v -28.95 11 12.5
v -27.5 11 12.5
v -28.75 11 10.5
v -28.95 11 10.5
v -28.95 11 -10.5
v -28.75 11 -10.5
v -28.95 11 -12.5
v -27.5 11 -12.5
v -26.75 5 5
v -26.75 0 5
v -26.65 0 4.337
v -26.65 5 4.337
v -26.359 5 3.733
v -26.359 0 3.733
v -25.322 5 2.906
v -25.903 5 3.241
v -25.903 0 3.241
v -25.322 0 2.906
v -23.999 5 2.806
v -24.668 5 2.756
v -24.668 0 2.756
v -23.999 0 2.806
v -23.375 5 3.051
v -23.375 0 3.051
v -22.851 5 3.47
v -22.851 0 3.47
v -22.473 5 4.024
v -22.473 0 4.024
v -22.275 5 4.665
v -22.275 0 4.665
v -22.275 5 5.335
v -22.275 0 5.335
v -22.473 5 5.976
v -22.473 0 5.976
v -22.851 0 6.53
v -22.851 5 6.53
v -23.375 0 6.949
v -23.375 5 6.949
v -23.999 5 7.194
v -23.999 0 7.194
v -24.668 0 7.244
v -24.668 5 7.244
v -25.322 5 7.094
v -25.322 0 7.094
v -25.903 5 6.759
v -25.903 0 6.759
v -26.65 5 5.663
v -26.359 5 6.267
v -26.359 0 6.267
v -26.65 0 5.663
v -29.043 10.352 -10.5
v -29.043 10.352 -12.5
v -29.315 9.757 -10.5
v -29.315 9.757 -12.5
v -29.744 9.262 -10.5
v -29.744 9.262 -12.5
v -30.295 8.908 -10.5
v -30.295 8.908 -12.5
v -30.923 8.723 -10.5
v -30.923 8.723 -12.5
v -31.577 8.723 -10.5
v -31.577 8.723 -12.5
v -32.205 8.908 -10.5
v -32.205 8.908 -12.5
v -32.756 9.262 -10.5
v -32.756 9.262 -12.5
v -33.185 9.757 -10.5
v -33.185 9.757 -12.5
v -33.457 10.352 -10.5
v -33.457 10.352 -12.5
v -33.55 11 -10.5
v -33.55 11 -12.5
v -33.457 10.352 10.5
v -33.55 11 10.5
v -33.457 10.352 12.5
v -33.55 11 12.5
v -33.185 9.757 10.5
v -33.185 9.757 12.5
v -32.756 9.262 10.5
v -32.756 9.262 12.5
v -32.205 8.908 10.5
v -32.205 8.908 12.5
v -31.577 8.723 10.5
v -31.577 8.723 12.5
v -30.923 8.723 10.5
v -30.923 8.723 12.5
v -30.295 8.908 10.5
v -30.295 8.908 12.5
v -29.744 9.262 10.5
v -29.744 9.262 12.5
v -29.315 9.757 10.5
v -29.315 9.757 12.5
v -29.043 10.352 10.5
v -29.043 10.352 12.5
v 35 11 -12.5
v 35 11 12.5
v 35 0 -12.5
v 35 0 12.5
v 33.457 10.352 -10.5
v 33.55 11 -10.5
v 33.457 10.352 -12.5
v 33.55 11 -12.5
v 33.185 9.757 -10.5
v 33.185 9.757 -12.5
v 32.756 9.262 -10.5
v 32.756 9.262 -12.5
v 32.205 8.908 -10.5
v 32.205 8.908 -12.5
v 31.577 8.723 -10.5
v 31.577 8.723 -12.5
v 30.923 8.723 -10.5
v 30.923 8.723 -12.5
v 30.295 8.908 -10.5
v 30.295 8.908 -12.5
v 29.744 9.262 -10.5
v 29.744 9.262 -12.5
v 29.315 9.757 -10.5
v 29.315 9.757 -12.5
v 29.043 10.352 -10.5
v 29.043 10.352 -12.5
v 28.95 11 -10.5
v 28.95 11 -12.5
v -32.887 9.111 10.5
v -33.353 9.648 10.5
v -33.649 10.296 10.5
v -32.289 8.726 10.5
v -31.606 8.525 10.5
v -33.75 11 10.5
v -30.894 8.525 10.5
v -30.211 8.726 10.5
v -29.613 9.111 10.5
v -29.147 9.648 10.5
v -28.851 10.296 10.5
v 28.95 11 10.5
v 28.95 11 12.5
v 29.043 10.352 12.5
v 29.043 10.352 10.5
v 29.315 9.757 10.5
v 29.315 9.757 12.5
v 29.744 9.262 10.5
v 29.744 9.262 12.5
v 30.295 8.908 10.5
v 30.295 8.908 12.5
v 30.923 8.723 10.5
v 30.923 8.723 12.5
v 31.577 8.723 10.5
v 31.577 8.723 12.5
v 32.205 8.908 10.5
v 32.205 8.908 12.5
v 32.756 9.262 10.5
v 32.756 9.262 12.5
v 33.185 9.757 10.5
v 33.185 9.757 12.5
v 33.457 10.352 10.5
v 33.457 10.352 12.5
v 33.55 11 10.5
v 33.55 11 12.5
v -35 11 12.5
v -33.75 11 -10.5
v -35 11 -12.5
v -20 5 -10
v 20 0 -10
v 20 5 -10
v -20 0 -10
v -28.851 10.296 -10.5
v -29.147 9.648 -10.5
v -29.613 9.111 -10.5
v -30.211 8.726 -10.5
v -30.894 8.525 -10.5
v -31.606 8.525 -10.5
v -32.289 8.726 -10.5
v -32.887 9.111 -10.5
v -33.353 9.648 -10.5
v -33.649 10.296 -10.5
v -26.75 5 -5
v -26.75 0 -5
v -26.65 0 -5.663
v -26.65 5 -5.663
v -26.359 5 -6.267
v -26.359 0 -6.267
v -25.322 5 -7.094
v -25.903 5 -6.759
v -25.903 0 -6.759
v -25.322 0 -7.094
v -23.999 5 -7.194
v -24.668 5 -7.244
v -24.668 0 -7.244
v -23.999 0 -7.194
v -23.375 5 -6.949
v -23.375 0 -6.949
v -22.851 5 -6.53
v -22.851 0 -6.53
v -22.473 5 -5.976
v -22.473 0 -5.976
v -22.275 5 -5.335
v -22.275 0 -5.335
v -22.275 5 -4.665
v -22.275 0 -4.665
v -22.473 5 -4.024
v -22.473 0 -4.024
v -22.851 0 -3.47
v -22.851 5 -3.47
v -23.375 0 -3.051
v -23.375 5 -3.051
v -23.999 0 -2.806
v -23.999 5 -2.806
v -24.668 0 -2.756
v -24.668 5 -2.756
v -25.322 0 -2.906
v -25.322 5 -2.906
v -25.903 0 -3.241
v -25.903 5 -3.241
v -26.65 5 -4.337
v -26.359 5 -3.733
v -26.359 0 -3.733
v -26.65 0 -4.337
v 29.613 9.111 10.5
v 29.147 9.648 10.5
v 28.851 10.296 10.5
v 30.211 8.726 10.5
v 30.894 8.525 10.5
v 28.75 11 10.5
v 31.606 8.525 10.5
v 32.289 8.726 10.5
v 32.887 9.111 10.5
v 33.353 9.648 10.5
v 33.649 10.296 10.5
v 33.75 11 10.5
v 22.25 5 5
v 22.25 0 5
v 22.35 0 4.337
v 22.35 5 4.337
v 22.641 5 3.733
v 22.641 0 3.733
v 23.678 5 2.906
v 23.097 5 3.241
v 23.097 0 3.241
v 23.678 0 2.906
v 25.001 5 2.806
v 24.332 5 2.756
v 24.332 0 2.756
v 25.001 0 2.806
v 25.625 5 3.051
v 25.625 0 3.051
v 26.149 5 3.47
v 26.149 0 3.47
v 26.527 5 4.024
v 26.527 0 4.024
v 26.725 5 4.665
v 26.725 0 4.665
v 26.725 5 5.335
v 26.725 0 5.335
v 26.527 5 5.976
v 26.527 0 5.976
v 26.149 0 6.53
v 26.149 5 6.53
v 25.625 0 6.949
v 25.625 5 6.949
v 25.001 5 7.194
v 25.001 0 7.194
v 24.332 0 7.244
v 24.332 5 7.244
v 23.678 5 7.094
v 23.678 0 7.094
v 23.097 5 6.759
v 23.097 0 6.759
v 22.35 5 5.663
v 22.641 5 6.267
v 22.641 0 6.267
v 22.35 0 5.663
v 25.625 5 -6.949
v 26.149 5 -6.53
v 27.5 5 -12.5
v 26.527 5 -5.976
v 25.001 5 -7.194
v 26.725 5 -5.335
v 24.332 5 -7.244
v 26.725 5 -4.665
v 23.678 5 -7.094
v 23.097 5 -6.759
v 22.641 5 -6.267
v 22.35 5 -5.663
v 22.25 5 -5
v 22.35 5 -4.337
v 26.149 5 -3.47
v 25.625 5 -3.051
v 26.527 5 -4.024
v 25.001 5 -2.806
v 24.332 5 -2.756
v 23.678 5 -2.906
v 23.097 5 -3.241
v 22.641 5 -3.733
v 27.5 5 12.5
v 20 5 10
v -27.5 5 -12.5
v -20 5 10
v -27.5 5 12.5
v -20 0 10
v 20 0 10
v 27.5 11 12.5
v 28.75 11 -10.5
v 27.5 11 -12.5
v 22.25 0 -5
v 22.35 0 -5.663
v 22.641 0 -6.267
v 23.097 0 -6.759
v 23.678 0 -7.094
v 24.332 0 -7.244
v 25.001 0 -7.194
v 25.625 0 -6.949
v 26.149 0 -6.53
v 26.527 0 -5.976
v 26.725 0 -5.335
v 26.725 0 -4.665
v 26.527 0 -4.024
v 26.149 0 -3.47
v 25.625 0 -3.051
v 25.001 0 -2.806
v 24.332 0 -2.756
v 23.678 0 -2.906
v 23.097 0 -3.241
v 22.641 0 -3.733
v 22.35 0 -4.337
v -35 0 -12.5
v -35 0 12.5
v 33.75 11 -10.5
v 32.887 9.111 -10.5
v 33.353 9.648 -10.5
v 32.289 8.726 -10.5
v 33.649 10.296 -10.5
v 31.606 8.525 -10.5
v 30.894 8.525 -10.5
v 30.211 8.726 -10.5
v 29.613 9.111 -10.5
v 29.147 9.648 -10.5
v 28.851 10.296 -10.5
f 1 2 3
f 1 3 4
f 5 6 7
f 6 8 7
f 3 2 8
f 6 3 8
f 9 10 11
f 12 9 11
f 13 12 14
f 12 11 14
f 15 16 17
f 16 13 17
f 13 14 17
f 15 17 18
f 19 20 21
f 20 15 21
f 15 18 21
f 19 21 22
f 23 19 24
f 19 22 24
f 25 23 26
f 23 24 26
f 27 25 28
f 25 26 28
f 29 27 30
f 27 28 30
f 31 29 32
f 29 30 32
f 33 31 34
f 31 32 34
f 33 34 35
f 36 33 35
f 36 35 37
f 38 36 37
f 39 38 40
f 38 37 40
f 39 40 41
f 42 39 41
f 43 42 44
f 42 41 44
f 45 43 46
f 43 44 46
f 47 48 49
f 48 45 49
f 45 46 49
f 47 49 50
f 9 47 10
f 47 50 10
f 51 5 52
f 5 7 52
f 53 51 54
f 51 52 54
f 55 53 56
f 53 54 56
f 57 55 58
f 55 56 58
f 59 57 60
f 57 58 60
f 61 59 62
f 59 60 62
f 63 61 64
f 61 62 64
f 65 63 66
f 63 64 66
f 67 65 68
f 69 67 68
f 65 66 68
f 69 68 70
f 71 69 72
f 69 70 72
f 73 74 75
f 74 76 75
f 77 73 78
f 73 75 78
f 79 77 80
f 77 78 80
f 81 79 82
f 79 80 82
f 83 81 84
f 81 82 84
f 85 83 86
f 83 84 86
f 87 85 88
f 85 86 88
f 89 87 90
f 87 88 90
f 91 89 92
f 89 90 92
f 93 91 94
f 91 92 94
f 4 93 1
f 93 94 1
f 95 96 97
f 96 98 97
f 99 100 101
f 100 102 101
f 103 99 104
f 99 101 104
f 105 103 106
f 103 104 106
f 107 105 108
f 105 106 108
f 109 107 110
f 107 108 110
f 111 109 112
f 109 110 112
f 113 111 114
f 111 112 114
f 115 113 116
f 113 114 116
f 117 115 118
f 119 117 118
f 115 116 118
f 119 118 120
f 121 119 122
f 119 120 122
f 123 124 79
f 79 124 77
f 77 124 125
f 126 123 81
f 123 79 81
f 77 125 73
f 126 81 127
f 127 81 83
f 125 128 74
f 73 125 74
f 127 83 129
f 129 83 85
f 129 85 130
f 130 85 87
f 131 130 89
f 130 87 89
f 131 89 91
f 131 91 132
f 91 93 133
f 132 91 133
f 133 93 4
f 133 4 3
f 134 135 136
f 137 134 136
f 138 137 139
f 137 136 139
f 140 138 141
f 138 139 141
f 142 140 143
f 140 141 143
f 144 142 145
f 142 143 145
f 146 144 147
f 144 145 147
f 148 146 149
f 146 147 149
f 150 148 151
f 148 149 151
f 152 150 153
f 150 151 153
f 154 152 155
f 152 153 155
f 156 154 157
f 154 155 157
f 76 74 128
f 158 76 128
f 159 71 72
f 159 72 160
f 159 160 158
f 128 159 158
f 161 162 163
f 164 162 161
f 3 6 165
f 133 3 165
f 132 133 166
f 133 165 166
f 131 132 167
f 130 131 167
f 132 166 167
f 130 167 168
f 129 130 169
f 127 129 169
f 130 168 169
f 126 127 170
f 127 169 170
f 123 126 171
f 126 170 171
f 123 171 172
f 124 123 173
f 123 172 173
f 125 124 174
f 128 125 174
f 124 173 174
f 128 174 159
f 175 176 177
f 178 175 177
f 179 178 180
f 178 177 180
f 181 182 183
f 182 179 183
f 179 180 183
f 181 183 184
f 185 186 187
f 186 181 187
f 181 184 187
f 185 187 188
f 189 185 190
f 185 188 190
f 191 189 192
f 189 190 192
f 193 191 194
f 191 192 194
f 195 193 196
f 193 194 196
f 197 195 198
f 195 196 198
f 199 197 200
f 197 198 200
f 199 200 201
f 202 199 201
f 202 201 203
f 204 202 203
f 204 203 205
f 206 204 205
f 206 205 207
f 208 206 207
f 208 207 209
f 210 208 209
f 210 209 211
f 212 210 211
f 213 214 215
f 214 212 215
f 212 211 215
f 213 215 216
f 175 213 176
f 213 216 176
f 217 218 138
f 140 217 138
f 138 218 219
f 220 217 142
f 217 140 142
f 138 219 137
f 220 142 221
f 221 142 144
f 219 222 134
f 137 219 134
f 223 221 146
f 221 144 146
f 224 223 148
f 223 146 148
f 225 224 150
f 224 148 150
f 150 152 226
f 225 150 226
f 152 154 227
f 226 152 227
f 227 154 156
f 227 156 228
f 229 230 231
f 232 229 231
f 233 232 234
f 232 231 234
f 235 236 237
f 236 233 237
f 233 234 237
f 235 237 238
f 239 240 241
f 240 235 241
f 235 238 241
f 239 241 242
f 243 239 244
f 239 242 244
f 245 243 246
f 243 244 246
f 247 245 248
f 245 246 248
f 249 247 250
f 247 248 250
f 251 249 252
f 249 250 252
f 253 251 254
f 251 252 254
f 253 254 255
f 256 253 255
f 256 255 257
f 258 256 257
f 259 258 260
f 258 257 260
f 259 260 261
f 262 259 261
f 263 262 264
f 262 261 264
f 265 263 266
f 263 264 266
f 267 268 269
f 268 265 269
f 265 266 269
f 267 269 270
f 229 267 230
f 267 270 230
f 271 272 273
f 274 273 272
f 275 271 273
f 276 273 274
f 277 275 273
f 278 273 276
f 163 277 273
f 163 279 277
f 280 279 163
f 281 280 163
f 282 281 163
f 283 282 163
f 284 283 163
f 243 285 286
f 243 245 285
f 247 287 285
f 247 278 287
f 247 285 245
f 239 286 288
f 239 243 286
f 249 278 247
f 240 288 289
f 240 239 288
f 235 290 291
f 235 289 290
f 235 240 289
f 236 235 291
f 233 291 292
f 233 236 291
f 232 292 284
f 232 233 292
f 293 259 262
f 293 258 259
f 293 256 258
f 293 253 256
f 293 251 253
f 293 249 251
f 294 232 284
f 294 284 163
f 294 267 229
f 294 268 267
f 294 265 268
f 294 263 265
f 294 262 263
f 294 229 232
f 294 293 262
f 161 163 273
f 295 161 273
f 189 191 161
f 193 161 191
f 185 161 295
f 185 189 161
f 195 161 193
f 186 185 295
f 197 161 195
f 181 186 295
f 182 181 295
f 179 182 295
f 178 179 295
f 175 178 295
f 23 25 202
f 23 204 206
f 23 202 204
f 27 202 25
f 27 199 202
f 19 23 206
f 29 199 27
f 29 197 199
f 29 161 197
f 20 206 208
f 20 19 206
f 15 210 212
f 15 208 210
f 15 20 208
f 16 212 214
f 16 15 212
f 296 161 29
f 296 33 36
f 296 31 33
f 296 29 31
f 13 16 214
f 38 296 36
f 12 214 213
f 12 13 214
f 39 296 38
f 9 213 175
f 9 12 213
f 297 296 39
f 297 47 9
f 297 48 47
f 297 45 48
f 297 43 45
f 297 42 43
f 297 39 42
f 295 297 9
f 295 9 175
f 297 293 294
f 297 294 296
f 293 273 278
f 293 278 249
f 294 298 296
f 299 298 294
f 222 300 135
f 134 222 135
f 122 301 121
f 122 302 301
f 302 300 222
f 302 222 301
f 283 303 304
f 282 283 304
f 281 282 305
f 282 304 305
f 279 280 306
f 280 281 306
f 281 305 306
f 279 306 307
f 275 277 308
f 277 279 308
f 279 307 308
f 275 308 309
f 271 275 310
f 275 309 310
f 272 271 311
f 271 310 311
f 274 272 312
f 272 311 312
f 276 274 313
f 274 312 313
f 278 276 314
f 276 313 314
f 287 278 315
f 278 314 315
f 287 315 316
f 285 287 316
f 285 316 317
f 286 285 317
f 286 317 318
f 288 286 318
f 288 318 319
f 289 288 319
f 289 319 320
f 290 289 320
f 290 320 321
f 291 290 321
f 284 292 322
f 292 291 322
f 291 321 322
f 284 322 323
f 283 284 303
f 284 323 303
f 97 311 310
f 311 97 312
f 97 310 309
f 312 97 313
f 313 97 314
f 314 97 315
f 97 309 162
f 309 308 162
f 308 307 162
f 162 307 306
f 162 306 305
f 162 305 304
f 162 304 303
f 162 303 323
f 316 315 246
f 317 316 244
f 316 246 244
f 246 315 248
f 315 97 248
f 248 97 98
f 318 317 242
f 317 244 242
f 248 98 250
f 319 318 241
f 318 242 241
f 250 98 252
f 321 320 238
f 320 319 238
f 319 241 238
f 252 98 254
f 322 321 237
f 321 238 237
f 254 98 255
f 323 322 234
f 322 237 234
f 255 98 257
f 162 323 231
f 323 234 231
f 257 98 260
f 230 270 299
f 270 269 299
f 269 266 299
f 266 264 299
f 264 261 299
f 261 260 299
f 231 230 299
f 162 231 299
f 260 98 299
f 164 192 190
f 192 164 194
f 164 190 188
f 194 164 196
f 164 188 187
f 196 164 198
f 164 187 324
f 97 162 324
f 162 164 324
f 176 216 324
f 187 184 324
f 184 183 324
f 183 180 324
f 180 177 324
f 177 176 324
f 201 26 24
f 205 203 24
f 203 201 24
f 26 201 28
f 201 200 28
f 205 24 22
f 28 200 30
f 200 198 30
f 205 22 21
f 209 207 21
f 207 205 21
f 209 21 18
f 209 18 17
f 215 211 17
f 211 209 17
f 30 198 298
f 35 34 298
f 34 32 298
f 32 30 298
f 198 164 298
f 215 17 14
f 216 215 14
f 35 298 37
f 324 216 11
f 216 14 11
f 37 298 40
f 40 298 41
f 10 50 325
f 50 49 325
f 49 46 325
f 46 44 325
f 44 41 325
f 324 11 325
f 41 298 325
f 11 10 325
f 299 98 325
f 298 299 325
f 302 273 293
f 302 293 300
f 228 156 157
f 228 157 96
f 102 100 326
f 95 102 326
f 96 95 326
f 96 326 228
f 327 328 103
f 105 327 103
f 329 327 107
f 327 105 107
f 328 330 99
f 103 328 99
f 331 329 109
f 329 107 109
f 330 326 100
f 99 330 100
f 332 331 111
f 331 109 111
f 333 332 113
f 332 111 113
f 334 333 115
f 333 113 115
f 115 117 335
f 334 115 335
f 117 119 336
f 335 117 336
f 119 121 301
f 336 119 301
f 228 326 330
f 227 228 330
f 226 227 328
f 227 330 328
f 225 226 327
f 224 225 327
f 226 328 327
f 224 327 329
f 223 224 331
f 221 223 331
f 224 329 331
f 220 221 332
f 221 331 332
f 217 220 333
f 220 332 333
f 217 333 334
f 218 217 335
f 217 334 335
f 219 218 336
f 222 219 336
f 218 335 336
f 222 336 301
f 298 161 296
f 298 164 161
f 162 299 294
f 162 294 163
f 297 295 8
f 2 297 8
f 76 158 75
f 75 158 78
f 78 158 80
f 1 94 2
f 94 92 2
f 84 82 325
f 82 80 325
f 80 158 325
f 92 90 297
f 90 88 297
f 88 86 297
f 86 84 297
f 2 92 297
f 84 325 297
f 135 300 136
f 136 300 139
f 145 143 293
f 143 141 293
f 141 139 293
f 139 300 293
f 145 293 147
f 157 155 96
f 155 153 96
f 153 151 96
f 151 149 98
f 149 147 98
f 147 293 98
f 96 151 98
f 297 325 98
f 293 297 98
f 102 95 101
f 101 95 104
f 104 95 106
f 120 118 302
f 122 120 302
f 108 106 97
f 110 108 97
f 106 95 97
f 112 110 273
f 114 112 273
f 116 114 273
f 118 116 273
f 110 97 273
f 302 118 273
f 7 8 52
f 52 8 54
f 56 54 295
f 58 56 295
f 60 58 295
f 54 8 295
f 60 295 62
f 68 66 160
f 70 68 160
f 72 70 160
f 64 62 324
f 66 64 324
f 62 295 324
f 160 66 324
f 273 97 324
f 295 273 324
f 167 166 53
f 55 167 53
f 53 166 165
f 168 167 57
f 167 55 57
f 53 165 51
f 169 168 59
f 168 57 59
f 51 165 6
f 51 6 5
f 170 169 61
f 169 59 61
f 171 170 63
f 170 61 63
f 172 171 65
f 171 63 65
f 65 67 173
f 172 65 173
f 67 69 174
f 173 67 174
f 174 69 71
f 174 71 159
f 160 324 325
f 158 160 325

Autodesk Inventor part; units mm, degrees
ref_plane "YZ Plane" through (0, 0, 0) normal (1, 0, 0) x (0, 1, 0)
ref_plane "XZ Plane" through (0, 0, 0) normal (0, 1, 0) x (-1, 0, 0)
ref_plane "XY Plane" through (0, 0, 0) normal (0, 0, 1) x (1, 0, 0)
sketch "Sketch1" plane through (0, 0, 0) normal (0, 1, 0) x (-1, 0, 0)
  line L0 (-35, -12.5) -> (35, -12.5)
  line L1 (35, -12.5) -> (35, 12.5)
  line L2 (35, 12.5) -> (-35, 12.5)
  line L3 (-35, 12.5) -> (-35, -12.5)
  line L4 (-35, -12.5) -> (35, 12.5) construction
  line L5 (35, -12.5) -> (-35, 12.5) construction
  line L6 (-24.5, -5) -> (24.5, -5) construction
  line L7 (24.5, -5) -> (24.5, 5) construction
  line L8 (24.5, 5) -> (-24.5, 5) construction
  line L9 (-24.5, 5) -> (-24.5, -5) construction
  line L10 (-24.5, -5) -> (24.5, 5) construction
  line L11 (24.5, -5) -> (-24.5, 5) construction
  circle A0 centre (24.5, 5) radius 2.25
  circle A1 centre (24.5, -5) radius 2.25
  circle A2 centre (-24.5, -5) radius 2.25
  circle A3 centre (-24.5, 5) radius 2.25
  line L12 (-20, -10) -> (20, -10)
  line L13 (20, -10) -> (20, 10)
  line L14 (20, 10) -> (-20, 10)
  line L15 (-20, 10) -> (-20, -10)
  line L16 (-20, -10) -> (20, 10) construction
  line L17 (20, -10) -> (-20, 10) construction
  point P0 (0, 0)
  dimension "d0" = 10
  dimension "d1" = 49
  dimension "d2" = 4.5
  dimension "d5" = 25
  dimension "d6" = 70
  dimension "d7" = 20
  dimension "d8" = 40
extrude "Extrusion1" add sketch "Sketch1" along normal blind 5
sketch "Sketch2" plane through (35, 0, -12.5) normal (0, 0, -1) x (-1, 0, 0)
  line L0 (62.5, 5) -> (62.5, 11)
  line L1 (62.5, 11) -> (70, 11)
  line L2 (70, 11) -> (70, 5)
  line L3 (70, 5) -> (62.5, 5)
  line L4 (35, -3.7897) -> (35, 10.3895) construction
  circle A0 centre (66.25, 11) radius 2.5
  line L5 (0, 5) -> (7.5, 5)
  circle A1 centre (66.25, 11) radius 2.3
  line L6 (7.5, 5) -> (7.5, 11)
  line L7 (7.5, 11) -> (0, 11)
  line L8 (0, 11) -> (0, 5)
  line L9 (0, 5) -> (7.5, 5)
  circle A2 centre (3.75, 11) radius 2.5
  circle A3 centre (3.75, 11) radius 2.3
  line L10 (0, 0) -> (70, 0) projected
  point P0 (35, 0)
  point P1 (35, 0)
  point P2 (68.75, 11)
  point P3 (63.75, 11)
  point P4 (35, 0)
  point P5 (6.05, 11)
  point P6 (1.45, 11)
  point P7 (1.25, 11)
  point P8 (6.25, 11)
  point P9 (68.55, 11)
  point P10 (63.95, 11)
  dimension "d9" = 5
  dimension "d10" = 7.5
  dimension "d12" = 6
  dimension "d18" = 0.2
extrude "Extrusion2" add sketch "Sketch2" against normal up to surface (25 mm away) contours L0 L1 A0 L2 L3 | L8 L7 A2 L6 L5
extrude "Extrusion4" add sketch "Sketch2" against normal blind 2 contours L1 A1 A0 | L7 A3 A2 picked at (64.2095, 9.7038) picked at (6.1368, 10.6171)
mirror "Mirror1" about plane through (0, 0, 0) normal (0, 0, 1) of "Extrusion4"
properties part number "Servo mount"
